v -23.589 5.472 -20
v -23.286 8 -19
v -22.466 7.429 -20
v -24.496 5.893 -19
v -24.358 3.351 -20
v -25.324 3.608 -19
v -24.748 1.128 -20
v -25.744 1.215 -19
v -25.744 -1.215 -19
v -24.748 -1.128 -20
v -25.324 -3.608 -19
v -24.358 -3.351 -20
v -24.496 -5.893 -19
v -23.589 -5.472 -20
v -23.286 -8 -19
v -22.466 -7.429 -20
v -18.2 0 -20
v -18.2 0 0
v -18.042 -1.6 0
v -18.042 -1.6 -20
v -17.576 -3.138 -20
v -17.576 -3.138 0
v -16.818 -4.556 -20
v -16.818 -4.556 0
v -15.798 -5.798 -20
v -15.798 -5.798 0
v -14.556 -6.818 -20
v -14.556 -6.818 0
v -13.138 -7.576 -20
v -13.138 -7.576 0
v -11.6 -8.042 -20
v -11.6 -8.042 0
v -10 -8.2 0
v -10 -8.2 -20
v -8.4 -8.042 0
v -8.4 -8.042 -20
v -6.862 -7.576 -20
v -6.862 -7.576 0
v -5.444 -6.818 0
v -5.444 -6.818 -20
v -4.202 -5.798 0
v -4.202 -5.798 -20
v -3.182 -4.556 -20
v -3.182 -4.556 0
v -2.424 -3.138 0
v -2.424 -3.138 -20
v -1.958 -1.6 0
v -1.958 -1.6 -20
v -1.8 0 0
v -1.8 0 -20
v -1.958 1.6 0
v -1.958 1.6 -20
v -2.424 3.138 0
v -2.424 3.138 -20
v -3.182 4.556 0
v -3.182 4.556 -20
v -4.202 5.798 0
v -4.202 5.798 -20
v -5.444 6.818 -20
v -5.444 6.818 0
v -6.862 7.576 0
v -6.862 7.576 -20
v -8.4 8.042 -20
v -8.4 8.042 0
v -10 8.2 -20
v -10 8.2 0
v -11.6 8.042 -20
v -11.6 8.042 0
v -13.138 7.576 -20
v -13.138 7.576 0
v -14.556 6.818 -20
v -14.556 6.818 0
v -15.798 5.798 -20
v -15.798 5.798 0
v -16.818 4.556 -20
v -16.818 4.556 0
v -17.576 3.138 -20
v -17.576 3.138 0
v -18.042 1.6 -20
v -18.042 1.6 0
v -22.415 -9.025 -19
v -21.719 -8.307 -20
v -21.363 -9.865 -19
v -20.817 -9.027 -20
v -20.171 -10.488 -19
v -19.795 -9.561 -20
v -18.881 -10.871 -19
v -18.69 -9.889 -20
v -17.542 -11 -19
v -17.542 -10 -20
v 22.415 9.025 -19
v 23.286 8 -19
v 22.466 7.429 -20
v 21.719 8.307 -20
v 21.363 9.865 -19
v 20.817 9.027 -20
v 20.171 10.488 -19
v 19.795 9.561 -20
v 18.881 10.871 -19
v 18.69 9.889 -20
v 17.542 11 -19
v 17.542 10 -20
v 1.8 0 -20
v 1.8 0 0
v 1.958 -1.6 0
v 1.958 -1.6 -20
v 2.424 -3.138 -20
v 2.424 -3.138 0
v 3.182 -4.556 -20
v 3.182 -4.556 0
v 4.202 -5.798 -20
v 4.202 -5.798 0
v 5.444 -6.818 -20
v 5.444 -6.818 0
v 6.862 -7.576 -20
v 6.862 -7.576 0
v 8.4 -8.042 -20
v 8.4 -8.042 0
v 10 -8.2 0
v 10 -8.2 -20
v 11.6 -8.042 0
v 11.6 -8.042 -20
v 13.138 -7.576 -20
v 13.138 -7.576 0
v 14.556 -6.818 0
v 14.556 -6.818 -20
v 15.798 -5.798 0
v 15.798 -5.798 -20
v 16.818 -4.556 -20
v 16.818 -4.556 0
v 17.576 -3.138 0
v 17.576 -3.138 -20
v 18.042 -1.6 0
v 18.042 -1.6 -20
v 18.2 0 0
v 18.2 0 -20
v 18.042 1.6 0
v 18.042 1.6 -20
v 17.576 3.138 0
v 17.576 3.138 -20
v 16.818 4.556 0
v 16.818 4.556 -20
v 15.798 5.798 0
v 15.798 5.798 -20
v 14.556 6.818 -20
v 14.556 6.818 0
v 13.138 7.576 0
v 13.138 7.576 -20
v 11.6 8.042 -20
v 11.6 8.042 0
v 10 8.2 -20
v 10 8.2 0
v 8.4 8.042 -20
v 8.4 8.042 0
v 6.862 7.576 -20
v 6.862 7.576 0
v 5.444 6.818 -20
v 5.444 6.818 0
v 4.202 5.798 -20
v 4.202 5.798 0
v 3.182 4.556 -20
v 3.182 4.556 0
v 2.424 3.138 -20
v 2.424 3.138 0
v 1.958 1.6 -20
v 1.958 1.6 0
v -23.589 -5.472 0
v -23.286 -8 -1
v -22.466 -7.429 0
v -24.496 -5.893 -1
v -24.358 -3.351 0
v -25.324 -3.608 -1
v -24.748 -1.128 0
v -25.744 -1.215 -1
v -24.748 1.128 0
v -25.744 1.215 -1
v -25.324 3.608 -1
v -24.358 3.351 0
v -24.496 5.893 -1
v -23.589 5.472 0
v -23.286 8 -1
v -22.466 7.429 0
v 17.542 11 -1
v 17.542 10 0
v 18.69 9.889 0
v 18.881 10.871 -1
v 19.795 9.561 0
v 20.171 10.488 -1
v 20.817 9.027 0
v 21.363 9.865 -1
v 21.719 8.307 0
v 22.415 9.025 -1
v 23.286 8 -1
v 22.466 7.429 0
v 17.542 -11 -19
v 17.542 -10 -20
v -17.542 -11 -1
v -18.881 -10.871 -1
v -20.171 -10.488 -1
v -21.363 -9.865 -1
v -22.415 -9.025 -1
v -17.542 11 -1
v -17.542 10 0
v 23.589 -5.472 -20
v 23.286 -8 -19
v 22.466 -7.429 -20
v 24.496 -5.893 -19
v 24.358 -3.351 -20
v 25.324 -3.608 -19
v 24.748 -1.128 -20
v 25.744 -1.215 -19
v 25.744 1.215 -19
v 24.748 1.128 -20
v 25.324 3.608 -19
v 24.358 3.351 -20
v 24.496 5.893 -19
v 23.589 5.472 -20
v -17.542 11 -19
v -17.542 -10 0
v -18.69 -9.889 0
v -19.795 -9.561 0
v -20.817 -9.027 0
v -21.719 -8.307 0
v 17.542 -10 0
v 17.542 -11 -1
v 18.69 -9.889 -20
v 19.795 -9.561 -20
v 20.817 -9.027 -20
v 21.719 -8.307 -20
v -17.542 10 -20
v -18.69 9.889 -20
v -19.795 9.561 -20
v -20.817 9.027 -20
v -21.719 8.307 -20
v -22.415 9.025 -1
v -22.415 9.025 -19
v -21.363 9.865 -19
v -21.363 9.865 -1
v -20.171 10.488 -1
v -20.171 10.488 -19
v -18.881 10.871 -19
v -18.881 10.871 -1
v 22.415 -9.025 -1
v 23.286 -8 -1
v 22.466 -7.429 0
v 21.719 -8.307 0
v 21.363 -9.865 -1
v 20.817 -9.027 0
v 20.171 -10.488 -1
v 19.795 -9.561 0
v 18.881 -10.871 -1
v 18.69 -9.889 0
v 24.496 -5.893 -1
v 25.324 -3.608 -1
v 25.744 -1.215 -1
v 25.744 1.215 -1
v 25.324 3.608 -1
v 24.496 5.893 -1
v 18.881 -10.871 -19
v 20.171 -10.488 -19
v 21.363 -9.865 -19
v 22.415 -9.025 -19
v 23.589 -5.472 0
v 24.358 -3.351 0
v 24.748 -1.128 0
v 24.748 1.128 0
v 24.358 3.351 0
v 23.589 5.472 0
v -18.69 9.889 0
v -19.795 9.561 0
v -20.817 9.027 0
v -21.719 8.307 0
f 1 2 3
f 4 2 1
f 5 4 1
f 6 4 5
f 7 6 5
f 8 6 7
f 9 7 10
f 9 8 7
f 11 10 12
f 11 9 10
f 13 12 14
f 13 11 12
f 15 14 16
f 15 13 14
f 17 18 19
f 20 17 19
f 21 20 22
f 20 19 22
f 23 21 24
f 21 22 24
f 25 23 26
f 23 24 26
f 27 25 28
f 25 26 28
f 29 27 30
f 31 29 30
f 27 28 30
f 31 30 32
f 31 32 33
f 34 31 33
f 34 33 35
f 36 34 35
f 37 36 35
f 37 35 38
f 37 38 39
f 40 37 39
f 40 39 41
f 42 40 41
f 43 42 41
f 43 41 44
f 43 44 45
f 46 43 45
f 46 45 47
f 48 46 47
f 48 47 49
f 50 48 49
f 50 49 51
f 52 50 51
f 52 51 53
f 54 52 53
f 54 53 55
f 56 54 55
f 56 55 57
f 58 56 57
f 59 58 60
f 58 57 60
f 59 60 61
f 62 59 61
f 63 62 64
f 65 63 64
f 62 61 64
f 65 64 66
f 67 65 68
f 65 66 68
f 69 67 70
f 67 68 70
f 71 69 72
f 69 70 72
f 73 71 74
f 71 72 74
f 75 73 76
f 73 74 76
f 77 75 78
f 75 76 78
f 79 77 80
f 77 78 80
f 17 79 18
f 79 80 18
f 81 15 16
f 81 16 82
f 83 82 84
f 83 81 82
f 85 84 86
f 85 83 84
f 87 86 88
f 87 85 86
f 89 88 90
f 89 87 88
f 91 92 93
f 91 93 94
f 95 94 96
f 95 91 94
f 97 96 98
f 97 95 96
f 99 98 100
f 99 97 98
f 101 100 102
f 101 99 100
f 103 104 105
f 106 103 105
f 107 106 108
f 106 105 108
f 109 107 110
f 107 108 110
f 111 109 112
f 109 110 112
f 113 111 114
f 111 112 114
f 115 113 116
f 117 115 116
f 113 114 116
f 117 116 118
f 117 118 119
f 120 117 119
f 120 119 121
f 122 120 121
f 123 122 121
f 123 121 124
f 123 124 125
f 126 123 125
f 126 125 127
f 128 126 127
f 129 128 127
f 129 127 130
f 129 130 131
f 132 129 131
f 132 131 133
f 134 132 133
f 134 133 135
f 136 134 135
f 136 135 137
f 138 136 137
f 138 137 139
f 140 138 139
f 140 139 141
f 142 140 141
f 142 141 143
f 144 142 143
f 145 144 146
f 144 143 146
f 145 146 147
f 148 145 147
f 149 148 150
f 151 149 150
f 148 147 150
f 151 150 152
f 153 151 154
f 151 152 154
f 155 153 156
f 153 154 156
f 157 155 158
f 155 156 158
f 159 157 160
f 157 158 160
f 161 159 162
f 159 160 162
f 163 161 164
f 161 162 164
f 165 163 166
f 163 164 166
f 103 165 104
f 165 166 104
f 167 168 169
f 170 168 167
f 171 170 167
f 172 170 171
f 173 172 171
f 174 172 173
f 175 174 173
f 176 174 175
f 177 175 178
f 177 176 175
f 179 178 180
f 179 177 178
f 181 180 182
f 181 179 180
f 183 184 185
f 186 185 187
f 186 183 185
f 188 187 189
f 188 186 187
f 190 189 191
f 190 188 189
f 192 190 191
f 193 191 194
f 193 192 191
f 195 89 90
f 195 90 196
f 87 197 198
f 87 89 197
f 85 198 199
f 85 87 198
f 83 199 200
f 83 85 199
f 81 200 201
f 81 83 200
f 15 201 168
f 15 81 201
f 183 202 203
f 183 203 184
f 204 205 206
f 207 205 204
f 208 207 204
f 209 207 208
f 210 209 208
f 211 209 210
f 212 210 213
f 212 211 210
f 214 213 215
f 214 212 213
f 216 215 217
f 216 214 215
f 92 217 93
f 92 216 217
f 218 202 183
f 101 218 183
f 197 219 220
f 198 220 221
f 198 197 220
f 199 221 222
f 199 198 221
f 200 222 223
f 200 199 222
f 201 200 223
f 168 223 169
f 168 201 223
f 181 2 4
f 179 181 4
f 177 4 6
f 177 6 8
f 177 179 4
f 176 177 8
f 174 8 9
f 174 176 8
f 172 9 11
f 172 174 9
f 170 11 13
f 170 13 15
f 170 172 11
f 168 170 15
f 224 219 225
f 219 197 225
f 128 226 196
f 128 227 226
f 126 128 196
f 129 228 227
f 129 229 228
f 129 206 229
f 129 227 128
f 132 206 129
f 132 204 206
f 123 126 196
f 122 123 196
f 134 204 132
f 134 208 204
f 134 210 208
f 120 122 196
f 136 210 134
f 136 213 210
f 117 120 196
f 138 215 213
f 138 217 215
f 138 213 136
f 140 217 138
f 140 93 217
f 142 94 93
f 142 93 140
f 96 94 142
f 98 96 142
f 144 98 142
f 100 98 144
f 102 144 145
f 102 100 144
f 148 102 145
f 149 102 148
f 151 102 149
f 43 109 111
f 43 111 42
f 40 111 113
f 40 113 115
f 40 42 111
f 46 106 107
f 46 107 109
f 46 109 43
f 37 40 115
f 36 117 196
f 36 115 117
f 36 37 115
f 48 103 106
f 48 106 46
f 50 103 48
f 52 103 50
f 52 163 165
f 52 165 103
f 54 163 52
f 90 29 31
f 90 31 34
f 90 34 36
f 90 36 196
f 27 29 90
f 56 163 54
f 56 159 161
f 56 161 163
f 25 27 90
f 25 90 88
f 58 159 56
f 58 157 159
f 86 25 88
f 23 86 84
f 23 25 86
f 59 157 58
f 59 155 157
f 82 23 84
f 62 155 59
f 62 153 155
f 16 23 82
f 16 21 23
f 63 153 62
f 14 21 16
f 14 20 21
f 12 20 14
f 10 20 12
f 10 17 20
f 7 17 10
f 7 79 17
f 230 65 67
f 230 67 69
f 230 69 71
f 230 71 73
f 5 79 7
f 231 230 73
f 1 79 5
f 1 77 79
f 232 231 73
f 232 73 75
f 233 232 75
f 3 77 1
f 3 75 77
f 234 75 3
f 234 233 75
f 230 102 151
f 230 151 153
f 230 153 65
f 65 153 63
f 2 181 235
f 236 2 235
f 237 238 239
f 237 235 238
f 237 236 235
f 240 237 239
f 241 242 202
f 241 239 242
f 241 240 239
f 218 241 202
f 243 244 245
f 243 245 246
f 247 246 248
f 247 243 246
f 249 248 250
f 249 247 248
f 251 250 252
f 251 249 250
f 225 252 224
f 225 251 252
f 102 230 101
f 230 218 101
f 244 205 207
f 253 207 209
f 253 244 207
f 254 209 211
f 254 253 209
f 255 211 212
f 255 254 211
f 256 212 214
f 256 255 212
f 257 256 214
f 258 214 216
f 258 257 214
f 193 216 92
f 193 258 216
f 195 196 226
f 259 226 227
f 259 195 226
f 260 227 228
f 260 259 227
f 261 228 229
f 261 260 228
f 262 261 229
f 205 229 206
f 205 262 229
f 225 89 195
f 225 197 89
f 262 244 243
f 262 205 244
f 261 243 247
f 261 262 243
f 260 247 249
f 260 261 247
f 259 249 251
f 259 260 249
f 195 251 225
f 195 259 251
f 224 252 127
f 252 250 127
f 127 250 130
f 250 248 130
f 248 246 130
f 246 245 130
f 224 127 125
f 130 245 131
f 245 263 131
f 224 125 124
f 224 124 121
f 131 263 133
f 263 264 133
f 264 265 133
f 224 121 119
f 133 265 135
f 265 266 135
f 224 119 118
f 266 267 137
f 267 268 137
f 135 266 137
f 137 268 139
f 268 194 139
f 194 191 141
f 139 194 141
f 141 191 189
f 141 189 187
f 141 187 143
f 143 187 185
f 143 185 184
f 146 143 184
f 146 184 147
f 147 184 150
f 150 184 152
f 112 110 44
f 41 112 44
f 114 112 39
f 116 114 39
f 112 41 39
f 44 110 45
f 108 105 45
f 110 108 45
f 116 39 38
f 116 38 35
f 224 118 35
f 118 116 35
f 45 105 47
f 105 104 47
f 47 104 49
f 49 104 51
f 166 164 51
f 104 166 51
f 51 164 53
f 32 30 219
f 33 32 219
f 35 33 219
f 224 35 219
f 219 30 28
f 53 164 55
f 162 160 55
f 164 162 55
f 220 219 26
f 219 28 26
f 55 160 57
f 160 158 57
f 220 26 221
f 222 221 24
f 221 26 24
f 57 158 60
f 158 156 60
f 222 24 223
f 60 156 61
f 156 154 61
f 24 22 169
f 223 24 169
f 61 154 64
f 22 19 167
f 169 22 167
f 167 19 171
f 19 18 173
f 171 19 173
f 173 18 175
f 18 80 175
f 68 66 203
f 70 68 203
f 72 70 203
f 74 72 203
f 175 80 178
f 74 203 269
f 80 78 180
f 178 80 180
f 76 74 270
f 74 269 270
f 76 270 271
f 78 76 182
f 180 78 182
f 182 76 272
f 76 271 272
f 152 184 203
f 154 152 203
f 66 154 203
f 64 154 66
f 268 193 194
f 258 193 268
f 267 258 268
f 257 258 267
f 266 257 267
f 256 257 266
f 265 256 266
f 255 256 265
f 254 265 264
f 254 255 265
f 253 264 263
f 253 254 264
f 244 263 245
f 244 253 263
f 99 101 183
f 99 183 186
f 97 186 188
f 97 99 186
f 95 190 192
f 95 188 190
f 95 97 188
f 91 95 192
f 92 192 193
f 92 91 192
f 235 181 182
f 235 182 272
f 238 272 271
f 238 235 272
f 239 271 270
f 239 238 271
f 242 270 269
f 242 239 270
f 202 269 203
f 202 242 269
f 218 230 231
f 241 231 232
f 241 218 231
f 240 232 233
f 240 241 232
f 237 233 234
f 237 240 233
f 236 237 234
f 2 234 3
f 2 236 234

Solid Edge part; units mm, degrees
sketch "Sketch1" plane through (0, 0, 0) normal (0, 0, 1) x (1, 0, 0)
  arc A0 (20.4574, 11) -> (20.4574, -11) centre (11.7971, 0) cw
  line L0 (-20.4574, -11) -> (20.4574, -11)
  arc A1 (-20.4574, 11) -> (-20.4574, -11) centre (-11.7971, 0) ccw
  line L1 (-20.4574, 11) -> (20.4574, 11)
  dimension "D1" = 14
  dimension "D2" = 22
extrude "Ajout_matière_1" add sketch "Sketch1" against normal blind 20
sketch "Sketch2" plane through (0, 0, 0) normal (0, 0, 1) x (-1, 0, 0)
  circle A0 centre (-10, 0) radius 8.2
  circle A1 centre (10, 0) radius 8.2
  dimension "D1" = 16.4
  dimension "D2" = 20
  dimension "D3" = 10
extrude "Cutout1" cut sketch "Sketch2" against normal through all and the other way up to next
fillet "Congé_1" radius 7 4 edges at (20.4574, -11, -10) (20.4574, 11, -10) (-20.4574, 11, -10) (-20.4574, -11, -10)
chamfer "Chanfrein_1" distance 1 angle 45 16 edges at (0, -11, 0) (-20.782, -10.2048, 0) (-25.7971, 0, 0) (-20.782, 10.2048, 0) (0, 11, 0) (20.782, 10.2048, 0) (25.7971, 0, 0) (20.782, -10.2048, 0) (0, -11, -20) (-20.782, -10.2048, -20) (-25.7971, 0, -20) (-20.782, 10.2048, -20) (0, 11, -20) (20.782, 10.2048, -20) (25.7971, 0, -20) (20.782, -10.2048, -20)
properties material "Plastique ABS, haute performance"
